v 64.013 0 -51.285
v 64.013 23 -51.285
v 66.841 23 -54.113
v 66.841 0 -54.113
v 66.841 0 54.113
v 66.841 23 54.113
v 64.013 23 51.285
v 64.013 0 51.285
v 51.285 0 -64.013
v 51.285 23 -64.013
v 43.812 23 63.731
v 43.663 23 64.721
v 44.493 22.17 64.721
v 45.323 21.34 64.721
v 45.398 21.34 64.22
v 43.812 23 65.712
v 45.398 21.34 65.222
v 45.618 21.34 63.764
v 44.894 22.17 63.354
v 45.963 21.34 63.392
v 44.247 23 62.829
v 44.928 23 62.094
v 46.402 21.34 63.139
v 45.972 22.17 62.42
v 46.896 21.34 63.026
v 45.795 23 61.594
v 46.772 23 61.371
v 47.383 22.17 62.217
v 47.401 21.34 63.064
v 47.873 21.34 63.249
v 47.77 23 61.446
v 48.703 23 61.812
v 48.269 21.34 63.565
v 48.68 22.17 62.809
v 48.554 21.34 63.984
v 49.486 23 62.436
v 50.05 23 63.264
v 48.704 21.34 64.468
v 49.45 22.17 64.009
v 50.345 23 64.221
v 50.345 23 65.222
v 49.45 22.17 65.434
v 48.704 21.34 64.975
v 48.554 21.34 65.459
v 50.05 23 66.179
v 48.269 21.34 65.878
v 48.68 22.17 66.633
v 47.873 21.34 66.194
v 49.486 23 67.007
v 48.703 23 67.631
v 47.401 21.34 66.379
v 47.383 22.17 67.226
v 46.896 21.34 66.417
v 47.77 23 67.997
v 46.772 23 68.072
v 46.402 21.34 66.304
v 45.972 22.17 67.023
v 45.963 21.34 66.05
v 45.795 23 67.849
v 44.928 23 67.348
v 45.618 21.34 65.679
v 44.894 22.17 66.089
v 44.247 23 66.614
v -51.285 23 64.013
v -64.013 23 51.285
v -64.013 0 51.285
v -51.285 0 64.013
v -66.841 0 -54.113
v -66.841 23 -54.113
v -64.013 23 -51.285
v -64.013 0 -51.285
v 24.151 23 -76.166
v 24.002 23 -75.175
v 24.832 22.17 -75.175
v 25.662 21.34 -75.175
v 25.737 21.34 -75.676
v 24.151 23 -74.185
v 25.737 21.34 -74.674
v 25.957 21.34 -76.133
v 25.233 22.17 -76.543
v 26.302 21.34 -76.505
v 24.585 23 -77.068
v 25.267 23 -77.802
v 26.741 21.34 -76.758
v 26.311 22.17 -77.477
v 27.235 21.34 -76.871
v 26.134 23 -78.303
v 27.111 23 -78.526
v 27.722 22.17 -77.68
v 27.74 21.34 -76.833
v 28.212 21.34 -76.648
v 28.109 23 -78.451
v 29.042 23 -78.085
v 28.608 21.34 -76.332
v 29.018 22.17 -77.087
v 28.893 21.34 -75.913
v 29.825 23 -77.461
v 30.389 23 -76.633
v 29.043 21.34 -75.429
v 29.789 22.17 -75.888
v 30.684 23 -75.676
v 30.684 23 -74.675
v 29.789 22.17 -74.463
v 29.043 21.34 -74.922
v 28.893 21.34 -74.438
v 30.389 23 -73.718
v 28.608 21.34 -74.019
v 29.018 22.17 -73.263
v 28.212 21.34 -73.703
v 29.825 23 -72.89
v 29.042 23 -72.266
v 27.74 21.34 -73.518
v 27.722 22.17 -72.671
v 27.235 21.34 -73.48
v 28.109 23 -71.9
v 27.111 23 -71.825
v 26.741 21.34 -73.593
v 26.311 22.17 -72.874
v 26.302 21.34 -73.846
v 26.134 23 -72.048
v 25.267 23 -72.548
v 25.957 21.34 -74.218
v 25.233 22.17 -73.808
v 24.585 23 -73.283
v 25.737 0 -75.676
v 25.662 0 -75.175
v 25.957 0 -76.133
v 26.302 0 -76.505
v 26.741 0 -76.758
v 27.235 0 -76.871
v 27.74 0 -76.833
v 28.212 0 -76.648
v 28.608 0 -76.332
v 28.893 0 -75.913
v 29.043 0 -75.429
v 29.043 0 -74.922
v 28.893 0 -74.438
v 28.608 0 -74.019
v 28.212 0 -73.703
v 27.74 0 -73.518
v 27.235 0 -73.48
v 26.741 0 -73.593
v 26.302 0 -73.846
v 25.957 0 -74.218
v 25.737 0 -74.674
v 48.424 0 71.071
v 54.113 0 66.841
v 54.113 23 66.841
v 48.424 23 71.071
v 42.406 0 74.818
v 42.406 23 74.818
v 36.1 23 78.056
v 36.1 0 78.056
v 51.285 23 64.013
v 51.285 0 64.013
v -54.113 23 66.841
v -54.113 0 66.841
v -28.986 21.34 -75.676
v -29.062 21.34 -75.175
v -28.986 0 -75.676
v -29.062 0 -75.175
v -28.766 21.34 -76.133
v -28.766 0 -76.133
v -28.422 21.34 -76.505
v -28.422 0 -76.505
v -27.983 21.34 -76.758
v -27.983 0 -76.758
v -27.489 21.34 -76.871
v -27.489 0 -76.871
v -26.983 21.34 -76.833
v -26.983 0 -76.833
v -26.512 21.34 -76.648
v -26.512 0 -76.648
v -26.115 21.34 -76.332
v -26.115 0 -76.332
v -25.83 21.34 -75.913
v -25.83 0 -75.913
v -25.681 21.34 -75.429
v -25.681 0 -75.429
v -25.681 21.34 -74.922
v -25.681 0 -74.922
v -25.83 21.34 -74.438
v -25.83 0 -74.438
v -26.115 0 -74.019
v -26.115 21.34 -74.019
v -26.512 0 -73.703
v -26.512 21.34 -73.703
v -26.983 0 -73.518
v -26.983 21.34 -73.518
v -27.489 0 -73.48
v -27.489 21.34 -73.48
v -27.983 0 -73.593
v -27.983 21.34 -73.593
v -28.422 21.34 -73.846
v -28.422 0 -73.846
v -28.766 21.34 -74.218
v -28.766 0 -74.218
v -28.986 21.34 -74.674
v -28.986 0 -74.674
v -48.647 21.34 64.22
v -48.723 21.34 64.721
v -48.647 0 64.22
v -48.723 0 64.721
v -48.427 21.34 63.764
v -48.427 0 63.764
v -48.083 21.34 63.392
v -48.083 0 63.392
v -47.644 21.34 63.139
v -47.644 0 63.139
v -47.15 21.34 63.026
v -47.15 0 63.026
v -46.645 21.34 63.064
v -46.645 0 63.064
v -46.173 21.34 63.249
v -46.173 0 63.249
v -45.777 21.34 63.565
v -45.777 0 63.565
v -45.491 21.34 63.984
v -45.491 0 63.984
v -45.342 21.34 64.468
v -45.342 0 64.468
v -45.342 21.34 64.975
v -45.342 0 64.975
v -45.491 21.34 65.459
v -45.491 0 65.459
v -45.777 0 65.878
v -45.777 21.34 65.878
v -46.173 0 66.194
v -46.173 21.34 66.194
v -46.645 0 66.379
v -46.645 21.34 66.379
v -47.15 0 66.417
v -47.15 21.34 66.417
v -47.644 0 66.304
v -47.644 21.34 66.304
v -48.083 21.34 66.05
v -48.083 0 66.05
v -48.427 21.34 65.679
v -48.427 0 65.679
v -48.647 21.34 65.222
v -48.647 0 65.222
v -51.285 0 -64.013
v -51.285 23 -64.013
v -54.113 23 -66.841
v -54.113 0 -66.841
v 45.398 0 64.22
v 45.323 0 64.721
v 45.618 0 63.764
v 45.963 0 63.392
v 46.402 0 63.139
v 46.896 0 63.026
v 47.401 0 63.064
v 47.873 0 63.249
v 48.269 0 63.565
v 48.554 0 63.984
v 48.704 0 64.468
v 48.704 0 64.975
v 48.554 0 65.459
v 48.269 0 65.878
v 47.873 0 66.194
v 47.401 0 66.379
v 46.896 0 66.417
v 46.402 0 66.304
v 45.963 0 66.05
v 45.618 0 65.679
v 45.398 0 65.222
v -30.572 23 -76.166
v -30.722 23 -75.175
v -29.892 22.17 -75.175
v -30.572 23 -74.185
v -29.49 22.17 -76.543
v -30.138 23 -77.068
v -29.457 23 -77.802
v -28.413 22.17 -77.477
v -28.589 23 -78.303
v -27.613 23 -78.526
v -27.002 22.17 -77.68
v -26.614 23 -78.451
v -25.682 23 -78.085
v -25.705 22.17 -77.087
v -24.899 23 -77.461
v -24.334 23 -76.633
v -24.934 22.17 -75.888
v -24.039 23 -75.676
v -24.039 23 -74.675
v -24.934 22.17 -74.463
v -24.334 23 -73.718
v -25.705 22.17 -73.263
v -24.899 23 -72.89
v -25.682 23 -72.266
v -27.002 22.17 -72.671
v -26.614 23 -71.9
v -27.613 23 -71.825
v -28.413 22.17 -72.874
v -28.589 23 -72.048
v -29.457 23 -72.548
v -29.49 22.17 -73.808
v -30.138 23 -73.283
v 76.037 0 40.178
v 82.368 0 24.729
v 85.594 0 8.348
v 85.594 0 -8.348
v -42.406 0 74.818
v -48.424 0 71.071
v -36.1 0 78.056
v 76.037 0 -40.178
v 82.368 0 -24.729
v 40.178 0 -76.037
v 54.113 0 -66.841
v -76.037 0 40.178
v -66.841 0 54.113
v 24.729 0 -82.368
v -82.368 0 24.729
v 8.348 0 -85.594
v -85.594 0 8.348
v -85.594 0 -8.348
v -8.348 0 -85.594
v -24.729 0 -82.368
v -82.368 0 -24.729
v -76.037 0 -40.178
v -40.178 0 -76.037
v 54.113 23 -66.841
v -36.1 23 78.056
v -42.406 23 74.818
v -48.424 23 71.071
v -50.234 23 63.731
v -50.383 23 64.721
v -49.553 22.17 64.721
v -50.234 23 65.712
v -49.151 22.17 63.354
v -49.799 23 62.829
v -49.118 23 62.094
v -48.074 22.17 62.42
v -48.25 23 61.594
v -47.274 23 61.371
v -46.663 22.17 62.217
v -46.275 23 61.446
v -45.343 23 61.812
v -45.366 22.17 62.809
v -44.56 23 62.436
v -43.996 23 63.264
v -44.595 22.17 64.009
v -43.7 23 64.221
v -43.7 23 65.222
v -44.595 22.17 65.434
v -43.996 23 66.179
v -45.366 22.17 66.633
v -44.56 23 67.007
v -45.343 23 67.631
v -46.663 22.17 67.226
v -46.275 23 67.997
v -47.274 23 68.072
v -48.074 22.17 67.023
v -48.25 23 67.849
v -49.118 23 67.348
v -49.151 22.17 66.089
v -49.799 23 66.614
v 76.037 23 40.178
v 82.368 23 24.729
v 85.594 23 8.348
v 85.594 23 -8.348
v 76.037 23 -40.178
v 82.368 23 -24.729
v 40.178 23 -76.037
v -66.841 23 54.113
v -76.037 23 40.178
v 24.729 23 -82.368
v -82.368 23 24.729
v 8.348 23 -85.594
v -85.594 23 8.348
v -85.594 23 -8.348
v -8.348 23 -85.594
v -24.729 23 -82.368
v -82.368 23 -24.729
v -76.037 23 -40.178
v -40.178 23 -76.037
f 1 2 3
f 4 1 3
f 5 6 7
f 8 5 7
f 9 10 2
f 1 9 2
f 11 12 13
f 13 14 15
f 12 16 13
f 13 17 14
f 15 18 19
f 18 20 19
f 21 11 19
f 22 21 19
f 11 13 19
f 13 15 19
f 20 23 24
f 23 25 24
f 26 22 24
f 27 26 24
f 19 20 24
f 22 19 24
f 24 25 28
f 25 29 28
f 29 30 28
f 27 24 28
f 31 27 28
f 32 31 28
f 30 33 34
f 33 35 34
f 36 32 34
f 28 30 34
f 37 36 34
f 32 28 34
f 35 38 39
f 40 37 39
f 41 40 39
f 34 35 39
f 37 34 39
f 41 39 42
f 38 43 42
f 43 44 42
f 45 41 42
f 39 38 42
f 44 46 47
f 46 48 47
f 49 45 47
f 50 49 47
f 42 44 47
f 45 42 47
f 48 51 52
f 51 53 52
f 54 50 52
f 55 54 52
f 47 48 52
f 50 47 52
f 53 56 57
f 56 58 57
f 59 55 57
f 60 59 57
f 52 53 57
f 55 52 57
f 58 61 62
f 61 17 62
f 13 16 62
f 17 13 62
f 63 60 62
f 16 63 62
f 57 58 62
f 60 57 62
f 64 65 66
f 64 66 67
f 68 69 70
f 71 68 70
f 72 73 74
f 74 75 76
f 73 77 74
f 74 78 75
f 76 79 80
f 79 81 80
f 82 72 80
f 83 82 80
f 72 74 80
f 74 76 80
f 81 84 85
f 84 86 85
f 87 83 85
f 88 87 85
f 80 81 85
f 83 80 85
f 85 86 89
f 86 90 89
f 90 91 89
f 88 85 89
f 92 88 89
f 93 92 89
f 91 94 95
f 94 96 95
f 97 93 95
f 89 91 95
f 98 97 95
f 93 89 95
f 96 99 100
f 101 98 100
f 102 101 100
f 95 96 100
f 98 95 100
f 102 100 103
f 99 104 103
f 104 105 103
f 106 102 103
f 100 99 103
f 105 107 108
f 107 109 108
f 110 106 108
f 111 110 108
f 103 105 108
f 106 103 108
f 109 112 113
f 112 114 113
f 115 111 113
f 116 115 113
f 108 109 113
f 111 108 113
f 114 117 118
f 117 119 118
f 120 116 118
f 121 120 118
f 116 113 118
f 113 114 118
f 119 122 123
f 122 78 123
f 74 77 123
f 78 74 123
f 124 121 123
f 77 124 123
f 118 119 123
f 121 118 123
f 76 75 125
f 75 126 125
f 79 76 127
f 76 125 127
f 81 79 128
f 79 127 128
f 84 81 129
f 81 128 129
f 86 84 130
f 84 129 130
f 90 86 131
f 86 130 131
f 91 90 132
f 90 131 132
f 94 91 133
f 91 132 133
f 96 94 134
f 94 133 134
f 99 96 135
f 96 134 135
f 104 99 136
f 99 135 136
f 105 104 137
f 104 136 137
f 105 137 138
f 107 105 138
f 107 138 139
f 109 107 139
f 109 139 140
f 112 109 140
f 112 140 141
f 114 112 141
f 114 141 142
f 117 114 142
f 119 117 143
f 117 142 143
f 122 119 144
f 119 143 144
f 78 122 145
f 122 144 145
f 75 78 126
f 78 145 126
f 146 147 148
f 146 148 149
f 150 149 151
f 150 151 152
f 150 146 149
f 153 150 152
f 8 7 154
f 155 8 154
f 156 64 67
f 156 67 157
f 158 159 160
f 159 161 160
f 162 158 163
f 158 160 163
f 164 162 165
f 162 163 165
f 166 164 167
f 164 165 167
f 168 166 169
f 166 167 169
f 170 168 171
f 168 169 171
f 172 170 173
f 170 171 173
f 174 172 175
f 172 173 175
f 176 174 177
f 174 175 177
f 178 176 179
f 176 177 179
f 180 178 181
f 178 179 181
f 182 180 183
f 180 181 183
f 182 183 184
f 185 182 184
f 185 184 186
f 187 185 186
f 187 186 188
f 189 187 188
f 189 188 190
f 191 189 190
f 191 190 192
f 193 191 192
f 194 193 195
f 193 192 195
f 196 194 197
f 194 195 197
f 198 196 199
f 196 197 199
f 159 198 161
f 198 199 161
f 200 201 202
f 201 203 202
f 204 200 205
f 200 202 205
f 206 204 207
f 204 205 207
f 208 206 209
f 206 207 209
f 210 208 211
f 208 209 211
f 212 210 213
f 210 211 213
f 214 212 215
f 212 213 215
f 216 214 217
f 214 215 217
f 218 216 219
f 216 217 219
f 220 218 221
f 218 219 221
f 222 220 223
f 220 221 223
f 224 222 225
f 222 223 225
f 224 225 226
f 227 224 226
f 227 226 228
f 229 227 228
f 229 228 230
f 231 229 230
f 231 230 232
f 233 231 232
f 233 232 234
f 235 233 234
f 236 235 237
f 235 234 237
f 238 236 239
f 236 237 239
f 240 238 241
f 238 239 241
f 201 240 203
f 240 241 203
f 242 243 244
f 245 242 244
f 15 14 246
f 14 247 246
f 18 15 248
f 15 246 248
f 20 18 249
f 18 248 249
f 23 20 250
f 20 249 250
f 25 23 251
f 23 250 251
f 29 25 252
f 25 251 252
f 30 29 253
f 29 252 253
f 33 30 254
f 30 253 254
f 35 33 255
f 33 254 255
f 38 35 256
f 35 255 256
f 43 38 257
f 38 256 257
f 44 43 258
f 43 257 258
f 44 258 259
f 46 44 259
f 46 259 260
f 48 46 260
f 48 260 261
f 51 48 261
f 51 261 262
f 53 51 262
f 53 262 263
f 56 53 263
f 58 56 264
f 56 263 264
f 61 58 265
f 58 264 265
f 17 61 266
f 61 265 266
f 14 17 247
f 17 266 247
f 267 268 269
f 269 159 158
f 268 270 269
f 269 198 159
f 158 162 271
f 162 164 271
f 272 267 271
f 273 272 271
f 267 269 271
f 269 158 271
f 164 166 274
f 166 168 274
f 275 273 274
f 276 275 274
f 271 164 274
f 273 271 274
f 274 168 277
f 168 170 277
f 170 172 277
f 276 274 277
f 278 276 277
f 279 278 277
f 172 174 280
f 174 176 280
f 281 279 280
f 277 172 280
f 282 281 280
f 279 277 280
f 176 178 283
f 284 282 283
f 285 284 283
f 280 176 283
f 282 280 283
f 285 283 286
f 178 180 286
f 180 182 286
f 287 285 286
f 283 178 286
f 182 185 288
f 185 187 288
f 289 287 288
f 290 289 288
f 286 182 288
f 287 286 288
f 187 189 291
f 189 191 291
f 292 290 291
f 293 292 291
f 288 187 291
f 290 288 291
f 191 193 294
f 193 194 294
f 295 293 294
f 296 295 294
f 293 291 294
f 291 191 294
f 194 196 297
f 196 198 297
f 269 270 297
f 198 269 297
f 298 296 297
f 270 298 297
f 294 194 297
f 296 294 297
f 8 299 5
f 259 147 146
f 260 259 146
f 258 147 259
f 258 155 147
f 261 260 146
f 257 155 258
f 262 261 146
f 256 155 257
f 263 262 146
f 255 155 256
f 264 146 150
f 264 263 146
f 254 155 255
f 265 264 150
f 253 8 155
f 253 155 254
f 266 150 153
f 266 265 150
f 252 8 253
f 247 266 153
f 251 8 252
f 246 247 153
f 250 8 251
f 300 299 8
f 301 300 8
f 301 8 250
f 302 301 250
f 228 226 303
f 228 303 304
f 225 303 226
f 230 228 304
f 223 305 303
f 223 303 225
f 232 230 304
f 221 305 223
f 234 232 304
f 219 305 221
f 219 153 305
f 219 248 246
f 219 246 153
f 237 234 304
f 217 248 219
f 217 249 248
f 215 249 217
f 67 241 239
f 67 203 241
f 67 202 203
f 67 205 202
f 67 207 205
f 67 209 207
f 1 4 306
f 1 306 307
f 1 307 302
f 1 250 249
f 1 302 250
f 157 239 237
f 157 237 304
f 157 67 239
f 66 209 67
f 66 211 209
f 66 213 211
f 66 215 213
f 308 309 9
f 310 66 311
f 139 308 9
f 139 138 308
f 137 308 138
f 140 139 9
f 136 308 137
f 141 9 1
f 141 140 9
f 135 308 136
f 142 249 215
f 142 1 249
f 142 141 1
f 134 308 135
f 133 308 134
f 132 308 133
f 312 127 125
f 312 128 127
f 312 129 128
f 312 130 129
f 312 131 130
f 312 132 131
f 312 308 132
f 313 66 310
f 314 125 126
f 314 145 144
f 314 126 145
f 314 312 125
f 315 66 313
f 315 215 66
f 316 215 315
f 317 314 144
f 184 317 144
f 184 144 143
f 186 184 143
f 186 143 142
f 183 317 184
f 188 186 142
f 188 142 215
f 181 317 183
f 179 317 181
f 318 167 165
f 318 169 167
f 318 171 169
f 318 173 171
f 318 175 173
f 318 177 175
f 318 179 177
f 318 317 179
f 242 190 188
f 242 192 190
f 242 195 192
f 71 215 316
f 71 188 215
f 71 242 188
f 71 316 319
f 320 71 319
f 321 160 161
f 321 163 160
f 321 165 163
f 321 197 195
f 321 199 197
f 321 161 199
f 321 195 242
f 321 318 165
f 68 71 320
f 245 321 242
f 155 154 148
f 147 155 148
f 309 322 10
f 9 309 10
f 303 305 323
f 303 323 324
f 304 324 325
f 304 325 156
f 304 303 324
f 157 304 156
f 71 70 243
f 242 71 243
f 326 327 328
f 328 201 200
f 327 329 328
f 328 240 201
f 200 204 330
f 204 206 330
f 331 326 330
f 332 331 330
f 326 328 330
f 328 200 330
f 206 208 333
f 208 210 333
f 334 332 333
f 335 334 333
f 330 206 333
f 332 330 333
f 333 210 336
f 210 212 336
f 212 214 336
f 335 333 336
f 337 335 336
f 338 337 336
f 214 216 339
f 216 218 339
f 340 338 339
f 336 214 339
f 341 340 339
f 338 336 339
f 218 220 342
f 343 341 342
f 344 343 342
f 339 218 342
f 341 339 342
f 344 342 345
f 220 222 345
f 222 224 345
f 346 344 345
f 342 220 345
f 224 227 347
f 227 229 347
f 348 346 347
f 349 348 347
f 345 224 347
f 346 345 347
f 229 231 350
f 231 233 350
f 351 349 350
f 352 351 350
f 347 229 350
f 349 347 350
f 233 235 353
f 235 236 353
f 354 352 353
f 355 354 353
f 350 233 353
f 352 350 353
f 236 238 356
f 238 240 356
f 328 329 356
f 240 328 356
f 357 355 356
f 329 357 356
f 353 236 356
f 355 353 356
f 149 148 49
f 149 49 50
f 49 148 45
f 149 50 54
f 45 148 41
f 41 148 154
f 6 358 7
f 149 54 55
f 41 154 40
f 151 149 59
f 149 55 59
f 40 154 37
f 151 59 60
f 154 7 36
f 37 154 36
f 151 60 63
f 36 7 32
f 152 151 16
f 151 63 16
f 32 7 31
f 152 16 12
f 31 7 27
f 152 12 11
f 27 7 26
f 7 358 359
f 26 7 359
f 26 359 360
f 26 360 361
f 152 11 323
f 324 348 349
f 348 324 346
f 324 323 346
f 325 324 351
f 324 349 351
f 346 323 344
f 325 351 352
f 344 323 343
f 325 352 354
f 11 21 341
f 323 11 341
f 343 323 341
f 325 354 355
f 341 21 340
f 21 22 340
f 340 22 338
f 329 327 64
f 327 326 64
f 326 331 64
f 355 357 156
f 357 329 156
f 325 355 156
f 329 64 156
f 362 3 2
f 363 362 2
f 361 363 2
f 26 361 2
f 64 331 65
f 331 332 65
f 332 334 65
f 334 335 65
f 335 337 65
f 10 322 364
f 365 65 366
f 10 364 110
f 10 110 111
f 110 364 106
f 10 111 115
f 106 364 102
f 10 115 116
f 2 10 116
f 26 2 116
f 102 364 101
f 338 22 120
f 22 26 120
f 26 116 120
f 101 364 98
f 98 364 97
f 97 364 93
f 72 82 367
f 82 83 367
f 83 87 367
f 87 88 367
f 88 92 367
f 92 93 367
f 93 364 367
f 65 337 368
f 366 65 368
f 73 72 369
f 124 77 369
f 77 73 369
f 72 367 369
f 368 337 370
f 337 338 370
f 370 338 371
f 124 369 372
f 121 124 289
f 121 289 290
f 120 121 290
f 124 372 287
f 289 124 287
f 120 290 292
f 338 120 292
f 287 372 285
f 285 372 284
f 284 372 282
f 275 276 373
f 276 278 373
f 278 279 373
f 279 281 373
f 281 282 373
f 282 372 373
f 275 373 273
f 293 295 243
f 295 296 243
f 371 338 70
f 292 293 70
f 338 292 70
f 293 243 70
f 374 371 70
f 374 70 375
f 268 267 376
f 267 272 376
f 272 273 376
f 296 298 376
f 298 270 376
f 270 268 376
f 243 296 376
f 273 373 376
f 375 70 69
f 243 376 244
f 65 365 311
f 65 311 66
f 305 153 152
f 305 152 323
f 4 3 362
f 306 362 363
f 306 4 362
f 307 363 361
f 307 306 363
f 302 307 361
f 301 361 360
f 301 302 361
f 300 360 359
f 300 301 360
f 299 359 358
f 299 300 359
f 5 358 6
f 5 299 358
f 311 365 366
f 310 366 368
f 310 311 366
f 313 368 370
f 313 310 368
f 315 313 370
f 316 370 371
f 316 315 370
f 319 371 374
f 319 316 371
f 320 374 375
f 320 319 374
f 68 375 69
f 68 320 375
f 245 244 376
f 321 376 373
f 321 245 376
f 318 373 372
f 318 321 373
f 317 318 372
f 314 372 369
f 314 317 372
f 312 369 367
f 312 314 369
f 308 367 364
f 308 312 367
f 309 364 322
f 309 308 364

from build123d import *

# Parameters (mm, degrees)
RESSALTO_EXTRUS_O1_DEPTH             = 23
ESCAREADO_PARA_SFHCS_M31_D           = 3.4
ESCAREADO_PARA_SFHCS_M31_CSINK_D     = 6.72
ESCAREADO_PARA_SFHCS_M31_CSINK_ANGLE = 90
CORTE_EXTRUS_O1_DEPTH                = 124.778027129


with BuildPart() as part:
    # Esboço1 → Ressalto-extrusão1 (new body)
    with BuildSketch(Plane(origin=(0, 0, 0), x_dir=(1, 0, 0), z_dir=(0, 1, 0))):
        with BuildLine():
            Line((36.1, -78.056325817), (-36.1, -78.056325817))
            ThreePointArc((-36.1, -78.056325817), (-45.453875584, -73.006473647), (-54.113307426, -66.841229488))
            Line((-54.113307426, -66.841229488), (-66.841229488, -54.113307426))
            ThreePointArc((-66.841229488, -54.113307426), (-86, 0), (-66.841229488, 54.113307426))
            Line((-66.841229488, 54.113307426), (-54.113307426, 66.841229488))
            ThreePointArc((-54.113307426, 66.841229488), (0, 86), (54.113307426, 66.841229488))
            Line((54.113307426, 66.841229488), (66.841229488, 54.113307426))
            ThreePointArc((66.841229488, 54.113307426), (86, 0), (66.841229488, -54.113307426))
            Line((66.841229488, -54.113307426), (54.113307426, -66.841229488))
            ThreePointArc((54.113307426, -66.841229488), (45.453875584, -73.006473647), (36.1, -78.056325817))
        make_face()
    extrude(amount=RESSALTO_EXTRUS_O1_DEPTH)

    # Escareado para SFHCS M31 (through all)
    with Locations(Plane(origin=(0, 23, 0), x_dir=(1, 0, 0), z_dir=(0, 1, 0))):
        with Locations((47.022820183, -64.72135955), (27.361611466, 75.175409663), (-47.022820183, -64.72135955), (-27.361611466, 75.175409663)):
            CounterSinkHole(ESCAREADO_PARA_SFHCS_M31_D / 2, ESCAREADO_PARA_SFHCS_M31_CSINK_D / 2, counter_sink_angle=ESCAREADO_PARA_SFHCS_M31_CSINK_ANGLE)

    # Esboço6 → Corte-extrusão1 (cut, through all)
    with BuildSketch(Plane(origin=(0, 23, 0), x_dir=(1, 0, 0), z_dir=(0, 1, 0))):
        Polygon((-66.841229488, -54.113307426), (-64.012802363, -51.284880301), (-51.284880301, -64.012802363), (-54.113307426, -66.841229488), align=None)
        Polygon((-66.841229488, 54.113307426), (-64.012802363, 51.284880301), (-51.284880301, 64.012802363), (-54.113307426, 66.841229488), align=None)
        Polygon((66.841229488, -54.113307426), (64.012802363, -51.284880301), (51.284880301, -64.012802363), (54.113307426, -66.841229488), align=None)
        Polygon((66.841229488, 54.113307426), (54.113307426, 66.841229488), (51.284880301, 64.012802363), (64.012802363, 51.284880301), align=None)
    extrude(amount=-CORTE_EXTRUS_O1_DEPTH, mode=Mode.SUBTRACT)


solid = part.part
